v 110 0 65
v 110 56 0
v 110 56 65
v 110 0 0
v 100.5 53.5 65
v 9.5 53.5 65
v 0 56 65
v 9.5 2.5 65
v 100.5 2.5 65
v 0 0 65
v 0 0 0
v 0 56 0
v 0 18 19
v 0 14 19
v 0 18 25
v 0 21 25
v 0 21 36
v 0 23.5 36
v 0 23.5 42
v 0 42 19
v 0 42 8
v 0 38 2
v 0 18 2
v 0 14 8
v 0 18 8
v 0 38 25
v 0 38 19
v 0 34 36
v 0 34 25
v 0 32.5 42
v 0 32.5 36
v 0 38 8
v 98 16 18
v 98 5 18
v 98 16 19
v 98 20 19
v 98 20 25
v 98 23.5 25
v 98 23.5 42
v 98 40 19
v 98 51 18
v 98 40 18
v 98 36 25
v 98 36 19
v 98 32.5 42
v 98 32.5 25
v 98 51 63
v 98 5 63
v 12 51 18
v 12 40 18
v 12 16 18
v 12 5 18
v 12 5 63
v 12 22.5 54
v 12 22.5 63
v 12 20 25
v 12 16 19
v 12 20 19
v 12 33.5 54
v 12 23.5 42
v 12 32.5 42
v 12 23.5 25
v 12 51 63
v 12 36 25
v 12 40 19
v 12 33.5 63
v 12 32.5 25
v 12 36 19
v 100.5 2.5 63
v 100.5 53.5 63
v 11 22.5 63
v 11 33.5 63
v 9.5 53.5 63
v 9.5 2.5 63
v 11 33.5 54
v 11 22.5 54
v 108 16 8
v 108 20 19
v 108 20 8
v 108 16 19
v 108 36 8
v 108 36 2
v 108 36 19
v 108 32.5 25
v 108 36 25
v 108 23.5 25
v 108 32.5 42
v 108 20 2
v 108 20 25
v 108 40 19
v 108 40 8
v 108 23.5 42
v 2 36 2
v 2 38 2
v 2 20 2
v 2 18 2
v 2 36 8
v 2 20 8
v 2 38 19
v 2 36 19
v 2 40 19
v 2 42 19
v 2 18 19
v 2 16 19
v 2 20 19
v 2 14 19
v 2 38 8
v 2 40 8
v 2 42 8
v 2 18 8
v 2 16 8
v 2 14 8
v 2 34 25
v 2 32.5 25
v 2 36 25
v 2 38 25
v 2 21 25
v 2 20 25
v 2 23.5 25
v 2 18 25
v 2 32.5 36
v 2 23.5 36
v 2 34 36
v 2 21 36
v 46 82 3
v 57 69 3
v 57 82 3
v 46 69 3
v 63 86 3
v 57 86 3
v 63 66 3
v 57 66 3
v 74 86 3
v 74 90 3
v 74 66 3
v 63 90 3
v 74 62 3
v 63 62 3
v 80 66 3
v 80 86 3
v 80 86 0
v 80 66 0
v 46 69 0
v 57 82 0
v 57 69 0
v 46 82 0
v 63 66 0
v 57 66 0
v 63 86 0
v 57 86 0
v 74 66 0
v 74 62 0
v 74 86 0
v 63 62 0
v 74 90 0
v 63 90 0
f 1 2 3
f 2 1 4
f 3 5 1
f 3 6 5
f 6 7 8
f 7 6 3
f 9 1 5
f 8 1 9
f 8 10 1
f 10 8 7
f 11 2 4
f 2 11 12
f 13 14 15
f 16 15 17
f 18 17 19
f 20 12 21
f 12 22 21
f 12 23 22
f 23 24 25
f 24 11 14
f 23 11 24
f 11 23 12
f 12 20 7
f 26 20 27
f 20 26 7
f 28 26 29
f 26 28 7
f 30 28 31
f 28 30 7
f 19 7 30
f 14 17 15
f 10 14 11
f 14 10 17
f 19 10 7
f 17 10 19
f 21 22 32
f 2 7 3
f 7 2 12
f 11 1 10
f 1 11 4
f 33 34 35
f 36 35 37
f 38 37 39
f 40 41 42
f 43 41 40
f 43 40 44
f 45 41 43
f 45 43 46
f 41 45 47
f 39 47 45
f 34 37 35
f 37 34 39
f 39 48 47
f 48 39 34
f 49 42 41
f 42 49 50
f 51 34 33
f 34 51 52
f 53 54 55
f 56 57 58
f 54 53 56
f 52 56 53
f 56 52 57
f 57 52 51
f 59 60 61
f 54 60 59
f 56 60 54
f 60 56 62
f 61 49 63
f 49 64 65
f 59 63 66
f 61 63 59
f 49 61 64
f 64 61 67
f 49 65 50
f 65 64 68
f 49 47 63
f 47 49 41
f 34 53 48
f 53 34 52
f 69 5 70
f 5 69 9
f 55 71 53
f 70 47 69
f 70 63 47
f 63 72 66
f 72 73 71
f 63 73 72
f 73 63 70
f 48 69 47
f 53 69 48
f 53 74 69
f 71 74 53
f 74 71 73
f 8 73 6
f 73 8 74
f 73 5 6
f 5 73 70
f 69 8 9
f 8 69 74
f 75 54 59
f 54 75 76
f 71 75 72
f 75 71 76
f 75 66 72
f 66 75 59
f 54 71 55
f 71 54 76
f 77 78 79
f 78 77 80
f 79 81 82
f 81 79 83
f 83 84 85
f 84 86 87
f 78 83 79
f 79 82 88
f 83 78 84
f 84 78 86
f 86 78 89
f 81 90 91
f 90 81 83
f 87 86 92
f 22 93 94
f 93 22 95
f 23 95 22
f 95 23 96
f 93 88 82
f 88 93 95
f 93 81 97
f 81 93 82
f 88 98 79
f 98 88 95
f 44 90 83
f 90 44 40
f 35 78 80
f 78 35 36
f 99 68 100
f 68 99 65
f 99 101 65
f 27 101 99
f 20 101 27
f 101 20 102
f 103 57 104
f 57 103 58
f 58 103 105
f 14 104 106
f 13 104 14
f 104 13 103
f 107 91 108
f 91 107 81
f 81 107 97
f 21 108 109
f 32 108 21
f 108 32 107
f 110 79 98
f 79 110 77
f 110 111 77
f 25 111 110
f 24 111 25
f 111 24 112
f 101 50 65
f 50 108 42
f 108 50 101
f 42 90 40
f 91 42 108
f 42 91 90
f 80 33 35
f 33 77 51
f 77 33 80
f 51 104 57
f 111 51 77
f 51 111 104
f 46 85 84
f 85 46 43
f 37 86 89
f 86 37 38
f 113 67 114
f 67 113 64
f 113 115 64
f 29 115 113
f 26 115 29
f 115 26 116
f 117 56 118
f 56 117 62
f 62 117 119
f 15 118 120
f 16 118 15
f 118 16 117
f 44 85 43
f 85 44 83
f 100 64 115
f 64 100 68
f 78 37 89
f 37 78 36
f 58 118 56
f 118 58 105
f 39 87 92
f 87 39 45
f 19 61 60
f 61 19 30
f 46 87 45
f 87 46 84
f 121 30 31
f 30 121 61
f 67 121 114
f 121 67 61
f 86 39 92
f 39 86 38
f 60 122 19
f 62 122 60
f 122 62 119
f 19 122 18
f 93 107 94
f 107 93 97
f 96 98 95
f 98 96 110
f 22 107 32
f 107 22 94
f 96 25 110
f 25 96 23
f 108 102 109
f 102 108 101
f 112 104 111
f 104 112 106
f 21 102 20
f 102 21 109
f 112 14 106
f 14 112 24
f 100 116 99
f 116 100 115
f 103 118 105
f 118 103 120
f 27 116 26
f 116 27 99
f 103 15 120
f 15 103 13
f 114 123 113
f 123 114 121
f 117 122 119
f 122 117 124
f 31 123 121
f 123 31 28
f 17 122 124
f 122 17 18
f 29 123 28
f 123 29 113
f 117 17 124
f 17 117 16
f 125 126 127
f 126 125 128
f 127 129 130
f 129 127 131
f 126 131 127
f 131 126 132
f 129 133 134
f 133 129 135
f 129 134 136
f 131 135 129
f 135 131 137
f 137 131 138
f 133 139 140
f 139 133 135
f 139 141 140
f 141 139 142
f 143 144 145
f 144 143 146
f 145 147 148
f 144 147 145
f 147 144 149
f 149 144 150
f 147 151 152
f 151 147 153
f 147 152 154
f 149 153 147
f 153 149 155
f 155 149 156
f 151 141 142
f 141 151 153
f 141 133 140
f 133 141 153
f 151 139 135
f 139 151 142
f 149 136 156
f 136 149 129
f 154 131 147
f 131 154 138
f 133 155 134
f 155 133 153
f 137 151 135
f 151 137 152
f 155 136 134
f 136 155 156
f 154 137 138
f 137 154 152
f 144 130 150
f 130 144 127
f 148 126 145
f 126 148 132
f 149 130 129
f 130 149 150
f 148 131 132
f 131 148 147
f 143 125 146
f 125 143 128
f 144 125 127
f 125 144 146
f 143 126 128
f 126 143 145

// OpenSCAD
difference()
{
	cube([110,56,65]);
	translate([12,5,18]) cube([86,46,51]);
	translate([9.5,2.5,63]) cube([91,51,3]);
	translate([11,22.5,54]) cube([1,11,11]);
	translate([97,22.5,54]) cube([1,11,11]);
	translate([-1,20,2]) cube([109,16,7]);
	translate([-1,16,8]) cube([109,24,11]);
	translate([-1,20,18]) cube([109,16,7]);
	translate([-1,23.5,24]) cube([109,9,18]);
	translate([-1,18,2]) cube([3,20,7]);
	translate([-1,14,8]) cube([3,28,11]);
	translate([-1,18,18]) cube([3,20,7]);
	translate([-1,21,24]) cube([3,13,12]);
}

translate ([80,48,0])
rotate([0,-90,0])
union()
{
	translate([0,18,0]) cube([3,20,7]);
	translate([0,14,6]) cube([3,28,11]);
	translate([0,18,16]) cube([3,20,7]);
	translate([0,21,22]) cube([3,13,12]);
}
